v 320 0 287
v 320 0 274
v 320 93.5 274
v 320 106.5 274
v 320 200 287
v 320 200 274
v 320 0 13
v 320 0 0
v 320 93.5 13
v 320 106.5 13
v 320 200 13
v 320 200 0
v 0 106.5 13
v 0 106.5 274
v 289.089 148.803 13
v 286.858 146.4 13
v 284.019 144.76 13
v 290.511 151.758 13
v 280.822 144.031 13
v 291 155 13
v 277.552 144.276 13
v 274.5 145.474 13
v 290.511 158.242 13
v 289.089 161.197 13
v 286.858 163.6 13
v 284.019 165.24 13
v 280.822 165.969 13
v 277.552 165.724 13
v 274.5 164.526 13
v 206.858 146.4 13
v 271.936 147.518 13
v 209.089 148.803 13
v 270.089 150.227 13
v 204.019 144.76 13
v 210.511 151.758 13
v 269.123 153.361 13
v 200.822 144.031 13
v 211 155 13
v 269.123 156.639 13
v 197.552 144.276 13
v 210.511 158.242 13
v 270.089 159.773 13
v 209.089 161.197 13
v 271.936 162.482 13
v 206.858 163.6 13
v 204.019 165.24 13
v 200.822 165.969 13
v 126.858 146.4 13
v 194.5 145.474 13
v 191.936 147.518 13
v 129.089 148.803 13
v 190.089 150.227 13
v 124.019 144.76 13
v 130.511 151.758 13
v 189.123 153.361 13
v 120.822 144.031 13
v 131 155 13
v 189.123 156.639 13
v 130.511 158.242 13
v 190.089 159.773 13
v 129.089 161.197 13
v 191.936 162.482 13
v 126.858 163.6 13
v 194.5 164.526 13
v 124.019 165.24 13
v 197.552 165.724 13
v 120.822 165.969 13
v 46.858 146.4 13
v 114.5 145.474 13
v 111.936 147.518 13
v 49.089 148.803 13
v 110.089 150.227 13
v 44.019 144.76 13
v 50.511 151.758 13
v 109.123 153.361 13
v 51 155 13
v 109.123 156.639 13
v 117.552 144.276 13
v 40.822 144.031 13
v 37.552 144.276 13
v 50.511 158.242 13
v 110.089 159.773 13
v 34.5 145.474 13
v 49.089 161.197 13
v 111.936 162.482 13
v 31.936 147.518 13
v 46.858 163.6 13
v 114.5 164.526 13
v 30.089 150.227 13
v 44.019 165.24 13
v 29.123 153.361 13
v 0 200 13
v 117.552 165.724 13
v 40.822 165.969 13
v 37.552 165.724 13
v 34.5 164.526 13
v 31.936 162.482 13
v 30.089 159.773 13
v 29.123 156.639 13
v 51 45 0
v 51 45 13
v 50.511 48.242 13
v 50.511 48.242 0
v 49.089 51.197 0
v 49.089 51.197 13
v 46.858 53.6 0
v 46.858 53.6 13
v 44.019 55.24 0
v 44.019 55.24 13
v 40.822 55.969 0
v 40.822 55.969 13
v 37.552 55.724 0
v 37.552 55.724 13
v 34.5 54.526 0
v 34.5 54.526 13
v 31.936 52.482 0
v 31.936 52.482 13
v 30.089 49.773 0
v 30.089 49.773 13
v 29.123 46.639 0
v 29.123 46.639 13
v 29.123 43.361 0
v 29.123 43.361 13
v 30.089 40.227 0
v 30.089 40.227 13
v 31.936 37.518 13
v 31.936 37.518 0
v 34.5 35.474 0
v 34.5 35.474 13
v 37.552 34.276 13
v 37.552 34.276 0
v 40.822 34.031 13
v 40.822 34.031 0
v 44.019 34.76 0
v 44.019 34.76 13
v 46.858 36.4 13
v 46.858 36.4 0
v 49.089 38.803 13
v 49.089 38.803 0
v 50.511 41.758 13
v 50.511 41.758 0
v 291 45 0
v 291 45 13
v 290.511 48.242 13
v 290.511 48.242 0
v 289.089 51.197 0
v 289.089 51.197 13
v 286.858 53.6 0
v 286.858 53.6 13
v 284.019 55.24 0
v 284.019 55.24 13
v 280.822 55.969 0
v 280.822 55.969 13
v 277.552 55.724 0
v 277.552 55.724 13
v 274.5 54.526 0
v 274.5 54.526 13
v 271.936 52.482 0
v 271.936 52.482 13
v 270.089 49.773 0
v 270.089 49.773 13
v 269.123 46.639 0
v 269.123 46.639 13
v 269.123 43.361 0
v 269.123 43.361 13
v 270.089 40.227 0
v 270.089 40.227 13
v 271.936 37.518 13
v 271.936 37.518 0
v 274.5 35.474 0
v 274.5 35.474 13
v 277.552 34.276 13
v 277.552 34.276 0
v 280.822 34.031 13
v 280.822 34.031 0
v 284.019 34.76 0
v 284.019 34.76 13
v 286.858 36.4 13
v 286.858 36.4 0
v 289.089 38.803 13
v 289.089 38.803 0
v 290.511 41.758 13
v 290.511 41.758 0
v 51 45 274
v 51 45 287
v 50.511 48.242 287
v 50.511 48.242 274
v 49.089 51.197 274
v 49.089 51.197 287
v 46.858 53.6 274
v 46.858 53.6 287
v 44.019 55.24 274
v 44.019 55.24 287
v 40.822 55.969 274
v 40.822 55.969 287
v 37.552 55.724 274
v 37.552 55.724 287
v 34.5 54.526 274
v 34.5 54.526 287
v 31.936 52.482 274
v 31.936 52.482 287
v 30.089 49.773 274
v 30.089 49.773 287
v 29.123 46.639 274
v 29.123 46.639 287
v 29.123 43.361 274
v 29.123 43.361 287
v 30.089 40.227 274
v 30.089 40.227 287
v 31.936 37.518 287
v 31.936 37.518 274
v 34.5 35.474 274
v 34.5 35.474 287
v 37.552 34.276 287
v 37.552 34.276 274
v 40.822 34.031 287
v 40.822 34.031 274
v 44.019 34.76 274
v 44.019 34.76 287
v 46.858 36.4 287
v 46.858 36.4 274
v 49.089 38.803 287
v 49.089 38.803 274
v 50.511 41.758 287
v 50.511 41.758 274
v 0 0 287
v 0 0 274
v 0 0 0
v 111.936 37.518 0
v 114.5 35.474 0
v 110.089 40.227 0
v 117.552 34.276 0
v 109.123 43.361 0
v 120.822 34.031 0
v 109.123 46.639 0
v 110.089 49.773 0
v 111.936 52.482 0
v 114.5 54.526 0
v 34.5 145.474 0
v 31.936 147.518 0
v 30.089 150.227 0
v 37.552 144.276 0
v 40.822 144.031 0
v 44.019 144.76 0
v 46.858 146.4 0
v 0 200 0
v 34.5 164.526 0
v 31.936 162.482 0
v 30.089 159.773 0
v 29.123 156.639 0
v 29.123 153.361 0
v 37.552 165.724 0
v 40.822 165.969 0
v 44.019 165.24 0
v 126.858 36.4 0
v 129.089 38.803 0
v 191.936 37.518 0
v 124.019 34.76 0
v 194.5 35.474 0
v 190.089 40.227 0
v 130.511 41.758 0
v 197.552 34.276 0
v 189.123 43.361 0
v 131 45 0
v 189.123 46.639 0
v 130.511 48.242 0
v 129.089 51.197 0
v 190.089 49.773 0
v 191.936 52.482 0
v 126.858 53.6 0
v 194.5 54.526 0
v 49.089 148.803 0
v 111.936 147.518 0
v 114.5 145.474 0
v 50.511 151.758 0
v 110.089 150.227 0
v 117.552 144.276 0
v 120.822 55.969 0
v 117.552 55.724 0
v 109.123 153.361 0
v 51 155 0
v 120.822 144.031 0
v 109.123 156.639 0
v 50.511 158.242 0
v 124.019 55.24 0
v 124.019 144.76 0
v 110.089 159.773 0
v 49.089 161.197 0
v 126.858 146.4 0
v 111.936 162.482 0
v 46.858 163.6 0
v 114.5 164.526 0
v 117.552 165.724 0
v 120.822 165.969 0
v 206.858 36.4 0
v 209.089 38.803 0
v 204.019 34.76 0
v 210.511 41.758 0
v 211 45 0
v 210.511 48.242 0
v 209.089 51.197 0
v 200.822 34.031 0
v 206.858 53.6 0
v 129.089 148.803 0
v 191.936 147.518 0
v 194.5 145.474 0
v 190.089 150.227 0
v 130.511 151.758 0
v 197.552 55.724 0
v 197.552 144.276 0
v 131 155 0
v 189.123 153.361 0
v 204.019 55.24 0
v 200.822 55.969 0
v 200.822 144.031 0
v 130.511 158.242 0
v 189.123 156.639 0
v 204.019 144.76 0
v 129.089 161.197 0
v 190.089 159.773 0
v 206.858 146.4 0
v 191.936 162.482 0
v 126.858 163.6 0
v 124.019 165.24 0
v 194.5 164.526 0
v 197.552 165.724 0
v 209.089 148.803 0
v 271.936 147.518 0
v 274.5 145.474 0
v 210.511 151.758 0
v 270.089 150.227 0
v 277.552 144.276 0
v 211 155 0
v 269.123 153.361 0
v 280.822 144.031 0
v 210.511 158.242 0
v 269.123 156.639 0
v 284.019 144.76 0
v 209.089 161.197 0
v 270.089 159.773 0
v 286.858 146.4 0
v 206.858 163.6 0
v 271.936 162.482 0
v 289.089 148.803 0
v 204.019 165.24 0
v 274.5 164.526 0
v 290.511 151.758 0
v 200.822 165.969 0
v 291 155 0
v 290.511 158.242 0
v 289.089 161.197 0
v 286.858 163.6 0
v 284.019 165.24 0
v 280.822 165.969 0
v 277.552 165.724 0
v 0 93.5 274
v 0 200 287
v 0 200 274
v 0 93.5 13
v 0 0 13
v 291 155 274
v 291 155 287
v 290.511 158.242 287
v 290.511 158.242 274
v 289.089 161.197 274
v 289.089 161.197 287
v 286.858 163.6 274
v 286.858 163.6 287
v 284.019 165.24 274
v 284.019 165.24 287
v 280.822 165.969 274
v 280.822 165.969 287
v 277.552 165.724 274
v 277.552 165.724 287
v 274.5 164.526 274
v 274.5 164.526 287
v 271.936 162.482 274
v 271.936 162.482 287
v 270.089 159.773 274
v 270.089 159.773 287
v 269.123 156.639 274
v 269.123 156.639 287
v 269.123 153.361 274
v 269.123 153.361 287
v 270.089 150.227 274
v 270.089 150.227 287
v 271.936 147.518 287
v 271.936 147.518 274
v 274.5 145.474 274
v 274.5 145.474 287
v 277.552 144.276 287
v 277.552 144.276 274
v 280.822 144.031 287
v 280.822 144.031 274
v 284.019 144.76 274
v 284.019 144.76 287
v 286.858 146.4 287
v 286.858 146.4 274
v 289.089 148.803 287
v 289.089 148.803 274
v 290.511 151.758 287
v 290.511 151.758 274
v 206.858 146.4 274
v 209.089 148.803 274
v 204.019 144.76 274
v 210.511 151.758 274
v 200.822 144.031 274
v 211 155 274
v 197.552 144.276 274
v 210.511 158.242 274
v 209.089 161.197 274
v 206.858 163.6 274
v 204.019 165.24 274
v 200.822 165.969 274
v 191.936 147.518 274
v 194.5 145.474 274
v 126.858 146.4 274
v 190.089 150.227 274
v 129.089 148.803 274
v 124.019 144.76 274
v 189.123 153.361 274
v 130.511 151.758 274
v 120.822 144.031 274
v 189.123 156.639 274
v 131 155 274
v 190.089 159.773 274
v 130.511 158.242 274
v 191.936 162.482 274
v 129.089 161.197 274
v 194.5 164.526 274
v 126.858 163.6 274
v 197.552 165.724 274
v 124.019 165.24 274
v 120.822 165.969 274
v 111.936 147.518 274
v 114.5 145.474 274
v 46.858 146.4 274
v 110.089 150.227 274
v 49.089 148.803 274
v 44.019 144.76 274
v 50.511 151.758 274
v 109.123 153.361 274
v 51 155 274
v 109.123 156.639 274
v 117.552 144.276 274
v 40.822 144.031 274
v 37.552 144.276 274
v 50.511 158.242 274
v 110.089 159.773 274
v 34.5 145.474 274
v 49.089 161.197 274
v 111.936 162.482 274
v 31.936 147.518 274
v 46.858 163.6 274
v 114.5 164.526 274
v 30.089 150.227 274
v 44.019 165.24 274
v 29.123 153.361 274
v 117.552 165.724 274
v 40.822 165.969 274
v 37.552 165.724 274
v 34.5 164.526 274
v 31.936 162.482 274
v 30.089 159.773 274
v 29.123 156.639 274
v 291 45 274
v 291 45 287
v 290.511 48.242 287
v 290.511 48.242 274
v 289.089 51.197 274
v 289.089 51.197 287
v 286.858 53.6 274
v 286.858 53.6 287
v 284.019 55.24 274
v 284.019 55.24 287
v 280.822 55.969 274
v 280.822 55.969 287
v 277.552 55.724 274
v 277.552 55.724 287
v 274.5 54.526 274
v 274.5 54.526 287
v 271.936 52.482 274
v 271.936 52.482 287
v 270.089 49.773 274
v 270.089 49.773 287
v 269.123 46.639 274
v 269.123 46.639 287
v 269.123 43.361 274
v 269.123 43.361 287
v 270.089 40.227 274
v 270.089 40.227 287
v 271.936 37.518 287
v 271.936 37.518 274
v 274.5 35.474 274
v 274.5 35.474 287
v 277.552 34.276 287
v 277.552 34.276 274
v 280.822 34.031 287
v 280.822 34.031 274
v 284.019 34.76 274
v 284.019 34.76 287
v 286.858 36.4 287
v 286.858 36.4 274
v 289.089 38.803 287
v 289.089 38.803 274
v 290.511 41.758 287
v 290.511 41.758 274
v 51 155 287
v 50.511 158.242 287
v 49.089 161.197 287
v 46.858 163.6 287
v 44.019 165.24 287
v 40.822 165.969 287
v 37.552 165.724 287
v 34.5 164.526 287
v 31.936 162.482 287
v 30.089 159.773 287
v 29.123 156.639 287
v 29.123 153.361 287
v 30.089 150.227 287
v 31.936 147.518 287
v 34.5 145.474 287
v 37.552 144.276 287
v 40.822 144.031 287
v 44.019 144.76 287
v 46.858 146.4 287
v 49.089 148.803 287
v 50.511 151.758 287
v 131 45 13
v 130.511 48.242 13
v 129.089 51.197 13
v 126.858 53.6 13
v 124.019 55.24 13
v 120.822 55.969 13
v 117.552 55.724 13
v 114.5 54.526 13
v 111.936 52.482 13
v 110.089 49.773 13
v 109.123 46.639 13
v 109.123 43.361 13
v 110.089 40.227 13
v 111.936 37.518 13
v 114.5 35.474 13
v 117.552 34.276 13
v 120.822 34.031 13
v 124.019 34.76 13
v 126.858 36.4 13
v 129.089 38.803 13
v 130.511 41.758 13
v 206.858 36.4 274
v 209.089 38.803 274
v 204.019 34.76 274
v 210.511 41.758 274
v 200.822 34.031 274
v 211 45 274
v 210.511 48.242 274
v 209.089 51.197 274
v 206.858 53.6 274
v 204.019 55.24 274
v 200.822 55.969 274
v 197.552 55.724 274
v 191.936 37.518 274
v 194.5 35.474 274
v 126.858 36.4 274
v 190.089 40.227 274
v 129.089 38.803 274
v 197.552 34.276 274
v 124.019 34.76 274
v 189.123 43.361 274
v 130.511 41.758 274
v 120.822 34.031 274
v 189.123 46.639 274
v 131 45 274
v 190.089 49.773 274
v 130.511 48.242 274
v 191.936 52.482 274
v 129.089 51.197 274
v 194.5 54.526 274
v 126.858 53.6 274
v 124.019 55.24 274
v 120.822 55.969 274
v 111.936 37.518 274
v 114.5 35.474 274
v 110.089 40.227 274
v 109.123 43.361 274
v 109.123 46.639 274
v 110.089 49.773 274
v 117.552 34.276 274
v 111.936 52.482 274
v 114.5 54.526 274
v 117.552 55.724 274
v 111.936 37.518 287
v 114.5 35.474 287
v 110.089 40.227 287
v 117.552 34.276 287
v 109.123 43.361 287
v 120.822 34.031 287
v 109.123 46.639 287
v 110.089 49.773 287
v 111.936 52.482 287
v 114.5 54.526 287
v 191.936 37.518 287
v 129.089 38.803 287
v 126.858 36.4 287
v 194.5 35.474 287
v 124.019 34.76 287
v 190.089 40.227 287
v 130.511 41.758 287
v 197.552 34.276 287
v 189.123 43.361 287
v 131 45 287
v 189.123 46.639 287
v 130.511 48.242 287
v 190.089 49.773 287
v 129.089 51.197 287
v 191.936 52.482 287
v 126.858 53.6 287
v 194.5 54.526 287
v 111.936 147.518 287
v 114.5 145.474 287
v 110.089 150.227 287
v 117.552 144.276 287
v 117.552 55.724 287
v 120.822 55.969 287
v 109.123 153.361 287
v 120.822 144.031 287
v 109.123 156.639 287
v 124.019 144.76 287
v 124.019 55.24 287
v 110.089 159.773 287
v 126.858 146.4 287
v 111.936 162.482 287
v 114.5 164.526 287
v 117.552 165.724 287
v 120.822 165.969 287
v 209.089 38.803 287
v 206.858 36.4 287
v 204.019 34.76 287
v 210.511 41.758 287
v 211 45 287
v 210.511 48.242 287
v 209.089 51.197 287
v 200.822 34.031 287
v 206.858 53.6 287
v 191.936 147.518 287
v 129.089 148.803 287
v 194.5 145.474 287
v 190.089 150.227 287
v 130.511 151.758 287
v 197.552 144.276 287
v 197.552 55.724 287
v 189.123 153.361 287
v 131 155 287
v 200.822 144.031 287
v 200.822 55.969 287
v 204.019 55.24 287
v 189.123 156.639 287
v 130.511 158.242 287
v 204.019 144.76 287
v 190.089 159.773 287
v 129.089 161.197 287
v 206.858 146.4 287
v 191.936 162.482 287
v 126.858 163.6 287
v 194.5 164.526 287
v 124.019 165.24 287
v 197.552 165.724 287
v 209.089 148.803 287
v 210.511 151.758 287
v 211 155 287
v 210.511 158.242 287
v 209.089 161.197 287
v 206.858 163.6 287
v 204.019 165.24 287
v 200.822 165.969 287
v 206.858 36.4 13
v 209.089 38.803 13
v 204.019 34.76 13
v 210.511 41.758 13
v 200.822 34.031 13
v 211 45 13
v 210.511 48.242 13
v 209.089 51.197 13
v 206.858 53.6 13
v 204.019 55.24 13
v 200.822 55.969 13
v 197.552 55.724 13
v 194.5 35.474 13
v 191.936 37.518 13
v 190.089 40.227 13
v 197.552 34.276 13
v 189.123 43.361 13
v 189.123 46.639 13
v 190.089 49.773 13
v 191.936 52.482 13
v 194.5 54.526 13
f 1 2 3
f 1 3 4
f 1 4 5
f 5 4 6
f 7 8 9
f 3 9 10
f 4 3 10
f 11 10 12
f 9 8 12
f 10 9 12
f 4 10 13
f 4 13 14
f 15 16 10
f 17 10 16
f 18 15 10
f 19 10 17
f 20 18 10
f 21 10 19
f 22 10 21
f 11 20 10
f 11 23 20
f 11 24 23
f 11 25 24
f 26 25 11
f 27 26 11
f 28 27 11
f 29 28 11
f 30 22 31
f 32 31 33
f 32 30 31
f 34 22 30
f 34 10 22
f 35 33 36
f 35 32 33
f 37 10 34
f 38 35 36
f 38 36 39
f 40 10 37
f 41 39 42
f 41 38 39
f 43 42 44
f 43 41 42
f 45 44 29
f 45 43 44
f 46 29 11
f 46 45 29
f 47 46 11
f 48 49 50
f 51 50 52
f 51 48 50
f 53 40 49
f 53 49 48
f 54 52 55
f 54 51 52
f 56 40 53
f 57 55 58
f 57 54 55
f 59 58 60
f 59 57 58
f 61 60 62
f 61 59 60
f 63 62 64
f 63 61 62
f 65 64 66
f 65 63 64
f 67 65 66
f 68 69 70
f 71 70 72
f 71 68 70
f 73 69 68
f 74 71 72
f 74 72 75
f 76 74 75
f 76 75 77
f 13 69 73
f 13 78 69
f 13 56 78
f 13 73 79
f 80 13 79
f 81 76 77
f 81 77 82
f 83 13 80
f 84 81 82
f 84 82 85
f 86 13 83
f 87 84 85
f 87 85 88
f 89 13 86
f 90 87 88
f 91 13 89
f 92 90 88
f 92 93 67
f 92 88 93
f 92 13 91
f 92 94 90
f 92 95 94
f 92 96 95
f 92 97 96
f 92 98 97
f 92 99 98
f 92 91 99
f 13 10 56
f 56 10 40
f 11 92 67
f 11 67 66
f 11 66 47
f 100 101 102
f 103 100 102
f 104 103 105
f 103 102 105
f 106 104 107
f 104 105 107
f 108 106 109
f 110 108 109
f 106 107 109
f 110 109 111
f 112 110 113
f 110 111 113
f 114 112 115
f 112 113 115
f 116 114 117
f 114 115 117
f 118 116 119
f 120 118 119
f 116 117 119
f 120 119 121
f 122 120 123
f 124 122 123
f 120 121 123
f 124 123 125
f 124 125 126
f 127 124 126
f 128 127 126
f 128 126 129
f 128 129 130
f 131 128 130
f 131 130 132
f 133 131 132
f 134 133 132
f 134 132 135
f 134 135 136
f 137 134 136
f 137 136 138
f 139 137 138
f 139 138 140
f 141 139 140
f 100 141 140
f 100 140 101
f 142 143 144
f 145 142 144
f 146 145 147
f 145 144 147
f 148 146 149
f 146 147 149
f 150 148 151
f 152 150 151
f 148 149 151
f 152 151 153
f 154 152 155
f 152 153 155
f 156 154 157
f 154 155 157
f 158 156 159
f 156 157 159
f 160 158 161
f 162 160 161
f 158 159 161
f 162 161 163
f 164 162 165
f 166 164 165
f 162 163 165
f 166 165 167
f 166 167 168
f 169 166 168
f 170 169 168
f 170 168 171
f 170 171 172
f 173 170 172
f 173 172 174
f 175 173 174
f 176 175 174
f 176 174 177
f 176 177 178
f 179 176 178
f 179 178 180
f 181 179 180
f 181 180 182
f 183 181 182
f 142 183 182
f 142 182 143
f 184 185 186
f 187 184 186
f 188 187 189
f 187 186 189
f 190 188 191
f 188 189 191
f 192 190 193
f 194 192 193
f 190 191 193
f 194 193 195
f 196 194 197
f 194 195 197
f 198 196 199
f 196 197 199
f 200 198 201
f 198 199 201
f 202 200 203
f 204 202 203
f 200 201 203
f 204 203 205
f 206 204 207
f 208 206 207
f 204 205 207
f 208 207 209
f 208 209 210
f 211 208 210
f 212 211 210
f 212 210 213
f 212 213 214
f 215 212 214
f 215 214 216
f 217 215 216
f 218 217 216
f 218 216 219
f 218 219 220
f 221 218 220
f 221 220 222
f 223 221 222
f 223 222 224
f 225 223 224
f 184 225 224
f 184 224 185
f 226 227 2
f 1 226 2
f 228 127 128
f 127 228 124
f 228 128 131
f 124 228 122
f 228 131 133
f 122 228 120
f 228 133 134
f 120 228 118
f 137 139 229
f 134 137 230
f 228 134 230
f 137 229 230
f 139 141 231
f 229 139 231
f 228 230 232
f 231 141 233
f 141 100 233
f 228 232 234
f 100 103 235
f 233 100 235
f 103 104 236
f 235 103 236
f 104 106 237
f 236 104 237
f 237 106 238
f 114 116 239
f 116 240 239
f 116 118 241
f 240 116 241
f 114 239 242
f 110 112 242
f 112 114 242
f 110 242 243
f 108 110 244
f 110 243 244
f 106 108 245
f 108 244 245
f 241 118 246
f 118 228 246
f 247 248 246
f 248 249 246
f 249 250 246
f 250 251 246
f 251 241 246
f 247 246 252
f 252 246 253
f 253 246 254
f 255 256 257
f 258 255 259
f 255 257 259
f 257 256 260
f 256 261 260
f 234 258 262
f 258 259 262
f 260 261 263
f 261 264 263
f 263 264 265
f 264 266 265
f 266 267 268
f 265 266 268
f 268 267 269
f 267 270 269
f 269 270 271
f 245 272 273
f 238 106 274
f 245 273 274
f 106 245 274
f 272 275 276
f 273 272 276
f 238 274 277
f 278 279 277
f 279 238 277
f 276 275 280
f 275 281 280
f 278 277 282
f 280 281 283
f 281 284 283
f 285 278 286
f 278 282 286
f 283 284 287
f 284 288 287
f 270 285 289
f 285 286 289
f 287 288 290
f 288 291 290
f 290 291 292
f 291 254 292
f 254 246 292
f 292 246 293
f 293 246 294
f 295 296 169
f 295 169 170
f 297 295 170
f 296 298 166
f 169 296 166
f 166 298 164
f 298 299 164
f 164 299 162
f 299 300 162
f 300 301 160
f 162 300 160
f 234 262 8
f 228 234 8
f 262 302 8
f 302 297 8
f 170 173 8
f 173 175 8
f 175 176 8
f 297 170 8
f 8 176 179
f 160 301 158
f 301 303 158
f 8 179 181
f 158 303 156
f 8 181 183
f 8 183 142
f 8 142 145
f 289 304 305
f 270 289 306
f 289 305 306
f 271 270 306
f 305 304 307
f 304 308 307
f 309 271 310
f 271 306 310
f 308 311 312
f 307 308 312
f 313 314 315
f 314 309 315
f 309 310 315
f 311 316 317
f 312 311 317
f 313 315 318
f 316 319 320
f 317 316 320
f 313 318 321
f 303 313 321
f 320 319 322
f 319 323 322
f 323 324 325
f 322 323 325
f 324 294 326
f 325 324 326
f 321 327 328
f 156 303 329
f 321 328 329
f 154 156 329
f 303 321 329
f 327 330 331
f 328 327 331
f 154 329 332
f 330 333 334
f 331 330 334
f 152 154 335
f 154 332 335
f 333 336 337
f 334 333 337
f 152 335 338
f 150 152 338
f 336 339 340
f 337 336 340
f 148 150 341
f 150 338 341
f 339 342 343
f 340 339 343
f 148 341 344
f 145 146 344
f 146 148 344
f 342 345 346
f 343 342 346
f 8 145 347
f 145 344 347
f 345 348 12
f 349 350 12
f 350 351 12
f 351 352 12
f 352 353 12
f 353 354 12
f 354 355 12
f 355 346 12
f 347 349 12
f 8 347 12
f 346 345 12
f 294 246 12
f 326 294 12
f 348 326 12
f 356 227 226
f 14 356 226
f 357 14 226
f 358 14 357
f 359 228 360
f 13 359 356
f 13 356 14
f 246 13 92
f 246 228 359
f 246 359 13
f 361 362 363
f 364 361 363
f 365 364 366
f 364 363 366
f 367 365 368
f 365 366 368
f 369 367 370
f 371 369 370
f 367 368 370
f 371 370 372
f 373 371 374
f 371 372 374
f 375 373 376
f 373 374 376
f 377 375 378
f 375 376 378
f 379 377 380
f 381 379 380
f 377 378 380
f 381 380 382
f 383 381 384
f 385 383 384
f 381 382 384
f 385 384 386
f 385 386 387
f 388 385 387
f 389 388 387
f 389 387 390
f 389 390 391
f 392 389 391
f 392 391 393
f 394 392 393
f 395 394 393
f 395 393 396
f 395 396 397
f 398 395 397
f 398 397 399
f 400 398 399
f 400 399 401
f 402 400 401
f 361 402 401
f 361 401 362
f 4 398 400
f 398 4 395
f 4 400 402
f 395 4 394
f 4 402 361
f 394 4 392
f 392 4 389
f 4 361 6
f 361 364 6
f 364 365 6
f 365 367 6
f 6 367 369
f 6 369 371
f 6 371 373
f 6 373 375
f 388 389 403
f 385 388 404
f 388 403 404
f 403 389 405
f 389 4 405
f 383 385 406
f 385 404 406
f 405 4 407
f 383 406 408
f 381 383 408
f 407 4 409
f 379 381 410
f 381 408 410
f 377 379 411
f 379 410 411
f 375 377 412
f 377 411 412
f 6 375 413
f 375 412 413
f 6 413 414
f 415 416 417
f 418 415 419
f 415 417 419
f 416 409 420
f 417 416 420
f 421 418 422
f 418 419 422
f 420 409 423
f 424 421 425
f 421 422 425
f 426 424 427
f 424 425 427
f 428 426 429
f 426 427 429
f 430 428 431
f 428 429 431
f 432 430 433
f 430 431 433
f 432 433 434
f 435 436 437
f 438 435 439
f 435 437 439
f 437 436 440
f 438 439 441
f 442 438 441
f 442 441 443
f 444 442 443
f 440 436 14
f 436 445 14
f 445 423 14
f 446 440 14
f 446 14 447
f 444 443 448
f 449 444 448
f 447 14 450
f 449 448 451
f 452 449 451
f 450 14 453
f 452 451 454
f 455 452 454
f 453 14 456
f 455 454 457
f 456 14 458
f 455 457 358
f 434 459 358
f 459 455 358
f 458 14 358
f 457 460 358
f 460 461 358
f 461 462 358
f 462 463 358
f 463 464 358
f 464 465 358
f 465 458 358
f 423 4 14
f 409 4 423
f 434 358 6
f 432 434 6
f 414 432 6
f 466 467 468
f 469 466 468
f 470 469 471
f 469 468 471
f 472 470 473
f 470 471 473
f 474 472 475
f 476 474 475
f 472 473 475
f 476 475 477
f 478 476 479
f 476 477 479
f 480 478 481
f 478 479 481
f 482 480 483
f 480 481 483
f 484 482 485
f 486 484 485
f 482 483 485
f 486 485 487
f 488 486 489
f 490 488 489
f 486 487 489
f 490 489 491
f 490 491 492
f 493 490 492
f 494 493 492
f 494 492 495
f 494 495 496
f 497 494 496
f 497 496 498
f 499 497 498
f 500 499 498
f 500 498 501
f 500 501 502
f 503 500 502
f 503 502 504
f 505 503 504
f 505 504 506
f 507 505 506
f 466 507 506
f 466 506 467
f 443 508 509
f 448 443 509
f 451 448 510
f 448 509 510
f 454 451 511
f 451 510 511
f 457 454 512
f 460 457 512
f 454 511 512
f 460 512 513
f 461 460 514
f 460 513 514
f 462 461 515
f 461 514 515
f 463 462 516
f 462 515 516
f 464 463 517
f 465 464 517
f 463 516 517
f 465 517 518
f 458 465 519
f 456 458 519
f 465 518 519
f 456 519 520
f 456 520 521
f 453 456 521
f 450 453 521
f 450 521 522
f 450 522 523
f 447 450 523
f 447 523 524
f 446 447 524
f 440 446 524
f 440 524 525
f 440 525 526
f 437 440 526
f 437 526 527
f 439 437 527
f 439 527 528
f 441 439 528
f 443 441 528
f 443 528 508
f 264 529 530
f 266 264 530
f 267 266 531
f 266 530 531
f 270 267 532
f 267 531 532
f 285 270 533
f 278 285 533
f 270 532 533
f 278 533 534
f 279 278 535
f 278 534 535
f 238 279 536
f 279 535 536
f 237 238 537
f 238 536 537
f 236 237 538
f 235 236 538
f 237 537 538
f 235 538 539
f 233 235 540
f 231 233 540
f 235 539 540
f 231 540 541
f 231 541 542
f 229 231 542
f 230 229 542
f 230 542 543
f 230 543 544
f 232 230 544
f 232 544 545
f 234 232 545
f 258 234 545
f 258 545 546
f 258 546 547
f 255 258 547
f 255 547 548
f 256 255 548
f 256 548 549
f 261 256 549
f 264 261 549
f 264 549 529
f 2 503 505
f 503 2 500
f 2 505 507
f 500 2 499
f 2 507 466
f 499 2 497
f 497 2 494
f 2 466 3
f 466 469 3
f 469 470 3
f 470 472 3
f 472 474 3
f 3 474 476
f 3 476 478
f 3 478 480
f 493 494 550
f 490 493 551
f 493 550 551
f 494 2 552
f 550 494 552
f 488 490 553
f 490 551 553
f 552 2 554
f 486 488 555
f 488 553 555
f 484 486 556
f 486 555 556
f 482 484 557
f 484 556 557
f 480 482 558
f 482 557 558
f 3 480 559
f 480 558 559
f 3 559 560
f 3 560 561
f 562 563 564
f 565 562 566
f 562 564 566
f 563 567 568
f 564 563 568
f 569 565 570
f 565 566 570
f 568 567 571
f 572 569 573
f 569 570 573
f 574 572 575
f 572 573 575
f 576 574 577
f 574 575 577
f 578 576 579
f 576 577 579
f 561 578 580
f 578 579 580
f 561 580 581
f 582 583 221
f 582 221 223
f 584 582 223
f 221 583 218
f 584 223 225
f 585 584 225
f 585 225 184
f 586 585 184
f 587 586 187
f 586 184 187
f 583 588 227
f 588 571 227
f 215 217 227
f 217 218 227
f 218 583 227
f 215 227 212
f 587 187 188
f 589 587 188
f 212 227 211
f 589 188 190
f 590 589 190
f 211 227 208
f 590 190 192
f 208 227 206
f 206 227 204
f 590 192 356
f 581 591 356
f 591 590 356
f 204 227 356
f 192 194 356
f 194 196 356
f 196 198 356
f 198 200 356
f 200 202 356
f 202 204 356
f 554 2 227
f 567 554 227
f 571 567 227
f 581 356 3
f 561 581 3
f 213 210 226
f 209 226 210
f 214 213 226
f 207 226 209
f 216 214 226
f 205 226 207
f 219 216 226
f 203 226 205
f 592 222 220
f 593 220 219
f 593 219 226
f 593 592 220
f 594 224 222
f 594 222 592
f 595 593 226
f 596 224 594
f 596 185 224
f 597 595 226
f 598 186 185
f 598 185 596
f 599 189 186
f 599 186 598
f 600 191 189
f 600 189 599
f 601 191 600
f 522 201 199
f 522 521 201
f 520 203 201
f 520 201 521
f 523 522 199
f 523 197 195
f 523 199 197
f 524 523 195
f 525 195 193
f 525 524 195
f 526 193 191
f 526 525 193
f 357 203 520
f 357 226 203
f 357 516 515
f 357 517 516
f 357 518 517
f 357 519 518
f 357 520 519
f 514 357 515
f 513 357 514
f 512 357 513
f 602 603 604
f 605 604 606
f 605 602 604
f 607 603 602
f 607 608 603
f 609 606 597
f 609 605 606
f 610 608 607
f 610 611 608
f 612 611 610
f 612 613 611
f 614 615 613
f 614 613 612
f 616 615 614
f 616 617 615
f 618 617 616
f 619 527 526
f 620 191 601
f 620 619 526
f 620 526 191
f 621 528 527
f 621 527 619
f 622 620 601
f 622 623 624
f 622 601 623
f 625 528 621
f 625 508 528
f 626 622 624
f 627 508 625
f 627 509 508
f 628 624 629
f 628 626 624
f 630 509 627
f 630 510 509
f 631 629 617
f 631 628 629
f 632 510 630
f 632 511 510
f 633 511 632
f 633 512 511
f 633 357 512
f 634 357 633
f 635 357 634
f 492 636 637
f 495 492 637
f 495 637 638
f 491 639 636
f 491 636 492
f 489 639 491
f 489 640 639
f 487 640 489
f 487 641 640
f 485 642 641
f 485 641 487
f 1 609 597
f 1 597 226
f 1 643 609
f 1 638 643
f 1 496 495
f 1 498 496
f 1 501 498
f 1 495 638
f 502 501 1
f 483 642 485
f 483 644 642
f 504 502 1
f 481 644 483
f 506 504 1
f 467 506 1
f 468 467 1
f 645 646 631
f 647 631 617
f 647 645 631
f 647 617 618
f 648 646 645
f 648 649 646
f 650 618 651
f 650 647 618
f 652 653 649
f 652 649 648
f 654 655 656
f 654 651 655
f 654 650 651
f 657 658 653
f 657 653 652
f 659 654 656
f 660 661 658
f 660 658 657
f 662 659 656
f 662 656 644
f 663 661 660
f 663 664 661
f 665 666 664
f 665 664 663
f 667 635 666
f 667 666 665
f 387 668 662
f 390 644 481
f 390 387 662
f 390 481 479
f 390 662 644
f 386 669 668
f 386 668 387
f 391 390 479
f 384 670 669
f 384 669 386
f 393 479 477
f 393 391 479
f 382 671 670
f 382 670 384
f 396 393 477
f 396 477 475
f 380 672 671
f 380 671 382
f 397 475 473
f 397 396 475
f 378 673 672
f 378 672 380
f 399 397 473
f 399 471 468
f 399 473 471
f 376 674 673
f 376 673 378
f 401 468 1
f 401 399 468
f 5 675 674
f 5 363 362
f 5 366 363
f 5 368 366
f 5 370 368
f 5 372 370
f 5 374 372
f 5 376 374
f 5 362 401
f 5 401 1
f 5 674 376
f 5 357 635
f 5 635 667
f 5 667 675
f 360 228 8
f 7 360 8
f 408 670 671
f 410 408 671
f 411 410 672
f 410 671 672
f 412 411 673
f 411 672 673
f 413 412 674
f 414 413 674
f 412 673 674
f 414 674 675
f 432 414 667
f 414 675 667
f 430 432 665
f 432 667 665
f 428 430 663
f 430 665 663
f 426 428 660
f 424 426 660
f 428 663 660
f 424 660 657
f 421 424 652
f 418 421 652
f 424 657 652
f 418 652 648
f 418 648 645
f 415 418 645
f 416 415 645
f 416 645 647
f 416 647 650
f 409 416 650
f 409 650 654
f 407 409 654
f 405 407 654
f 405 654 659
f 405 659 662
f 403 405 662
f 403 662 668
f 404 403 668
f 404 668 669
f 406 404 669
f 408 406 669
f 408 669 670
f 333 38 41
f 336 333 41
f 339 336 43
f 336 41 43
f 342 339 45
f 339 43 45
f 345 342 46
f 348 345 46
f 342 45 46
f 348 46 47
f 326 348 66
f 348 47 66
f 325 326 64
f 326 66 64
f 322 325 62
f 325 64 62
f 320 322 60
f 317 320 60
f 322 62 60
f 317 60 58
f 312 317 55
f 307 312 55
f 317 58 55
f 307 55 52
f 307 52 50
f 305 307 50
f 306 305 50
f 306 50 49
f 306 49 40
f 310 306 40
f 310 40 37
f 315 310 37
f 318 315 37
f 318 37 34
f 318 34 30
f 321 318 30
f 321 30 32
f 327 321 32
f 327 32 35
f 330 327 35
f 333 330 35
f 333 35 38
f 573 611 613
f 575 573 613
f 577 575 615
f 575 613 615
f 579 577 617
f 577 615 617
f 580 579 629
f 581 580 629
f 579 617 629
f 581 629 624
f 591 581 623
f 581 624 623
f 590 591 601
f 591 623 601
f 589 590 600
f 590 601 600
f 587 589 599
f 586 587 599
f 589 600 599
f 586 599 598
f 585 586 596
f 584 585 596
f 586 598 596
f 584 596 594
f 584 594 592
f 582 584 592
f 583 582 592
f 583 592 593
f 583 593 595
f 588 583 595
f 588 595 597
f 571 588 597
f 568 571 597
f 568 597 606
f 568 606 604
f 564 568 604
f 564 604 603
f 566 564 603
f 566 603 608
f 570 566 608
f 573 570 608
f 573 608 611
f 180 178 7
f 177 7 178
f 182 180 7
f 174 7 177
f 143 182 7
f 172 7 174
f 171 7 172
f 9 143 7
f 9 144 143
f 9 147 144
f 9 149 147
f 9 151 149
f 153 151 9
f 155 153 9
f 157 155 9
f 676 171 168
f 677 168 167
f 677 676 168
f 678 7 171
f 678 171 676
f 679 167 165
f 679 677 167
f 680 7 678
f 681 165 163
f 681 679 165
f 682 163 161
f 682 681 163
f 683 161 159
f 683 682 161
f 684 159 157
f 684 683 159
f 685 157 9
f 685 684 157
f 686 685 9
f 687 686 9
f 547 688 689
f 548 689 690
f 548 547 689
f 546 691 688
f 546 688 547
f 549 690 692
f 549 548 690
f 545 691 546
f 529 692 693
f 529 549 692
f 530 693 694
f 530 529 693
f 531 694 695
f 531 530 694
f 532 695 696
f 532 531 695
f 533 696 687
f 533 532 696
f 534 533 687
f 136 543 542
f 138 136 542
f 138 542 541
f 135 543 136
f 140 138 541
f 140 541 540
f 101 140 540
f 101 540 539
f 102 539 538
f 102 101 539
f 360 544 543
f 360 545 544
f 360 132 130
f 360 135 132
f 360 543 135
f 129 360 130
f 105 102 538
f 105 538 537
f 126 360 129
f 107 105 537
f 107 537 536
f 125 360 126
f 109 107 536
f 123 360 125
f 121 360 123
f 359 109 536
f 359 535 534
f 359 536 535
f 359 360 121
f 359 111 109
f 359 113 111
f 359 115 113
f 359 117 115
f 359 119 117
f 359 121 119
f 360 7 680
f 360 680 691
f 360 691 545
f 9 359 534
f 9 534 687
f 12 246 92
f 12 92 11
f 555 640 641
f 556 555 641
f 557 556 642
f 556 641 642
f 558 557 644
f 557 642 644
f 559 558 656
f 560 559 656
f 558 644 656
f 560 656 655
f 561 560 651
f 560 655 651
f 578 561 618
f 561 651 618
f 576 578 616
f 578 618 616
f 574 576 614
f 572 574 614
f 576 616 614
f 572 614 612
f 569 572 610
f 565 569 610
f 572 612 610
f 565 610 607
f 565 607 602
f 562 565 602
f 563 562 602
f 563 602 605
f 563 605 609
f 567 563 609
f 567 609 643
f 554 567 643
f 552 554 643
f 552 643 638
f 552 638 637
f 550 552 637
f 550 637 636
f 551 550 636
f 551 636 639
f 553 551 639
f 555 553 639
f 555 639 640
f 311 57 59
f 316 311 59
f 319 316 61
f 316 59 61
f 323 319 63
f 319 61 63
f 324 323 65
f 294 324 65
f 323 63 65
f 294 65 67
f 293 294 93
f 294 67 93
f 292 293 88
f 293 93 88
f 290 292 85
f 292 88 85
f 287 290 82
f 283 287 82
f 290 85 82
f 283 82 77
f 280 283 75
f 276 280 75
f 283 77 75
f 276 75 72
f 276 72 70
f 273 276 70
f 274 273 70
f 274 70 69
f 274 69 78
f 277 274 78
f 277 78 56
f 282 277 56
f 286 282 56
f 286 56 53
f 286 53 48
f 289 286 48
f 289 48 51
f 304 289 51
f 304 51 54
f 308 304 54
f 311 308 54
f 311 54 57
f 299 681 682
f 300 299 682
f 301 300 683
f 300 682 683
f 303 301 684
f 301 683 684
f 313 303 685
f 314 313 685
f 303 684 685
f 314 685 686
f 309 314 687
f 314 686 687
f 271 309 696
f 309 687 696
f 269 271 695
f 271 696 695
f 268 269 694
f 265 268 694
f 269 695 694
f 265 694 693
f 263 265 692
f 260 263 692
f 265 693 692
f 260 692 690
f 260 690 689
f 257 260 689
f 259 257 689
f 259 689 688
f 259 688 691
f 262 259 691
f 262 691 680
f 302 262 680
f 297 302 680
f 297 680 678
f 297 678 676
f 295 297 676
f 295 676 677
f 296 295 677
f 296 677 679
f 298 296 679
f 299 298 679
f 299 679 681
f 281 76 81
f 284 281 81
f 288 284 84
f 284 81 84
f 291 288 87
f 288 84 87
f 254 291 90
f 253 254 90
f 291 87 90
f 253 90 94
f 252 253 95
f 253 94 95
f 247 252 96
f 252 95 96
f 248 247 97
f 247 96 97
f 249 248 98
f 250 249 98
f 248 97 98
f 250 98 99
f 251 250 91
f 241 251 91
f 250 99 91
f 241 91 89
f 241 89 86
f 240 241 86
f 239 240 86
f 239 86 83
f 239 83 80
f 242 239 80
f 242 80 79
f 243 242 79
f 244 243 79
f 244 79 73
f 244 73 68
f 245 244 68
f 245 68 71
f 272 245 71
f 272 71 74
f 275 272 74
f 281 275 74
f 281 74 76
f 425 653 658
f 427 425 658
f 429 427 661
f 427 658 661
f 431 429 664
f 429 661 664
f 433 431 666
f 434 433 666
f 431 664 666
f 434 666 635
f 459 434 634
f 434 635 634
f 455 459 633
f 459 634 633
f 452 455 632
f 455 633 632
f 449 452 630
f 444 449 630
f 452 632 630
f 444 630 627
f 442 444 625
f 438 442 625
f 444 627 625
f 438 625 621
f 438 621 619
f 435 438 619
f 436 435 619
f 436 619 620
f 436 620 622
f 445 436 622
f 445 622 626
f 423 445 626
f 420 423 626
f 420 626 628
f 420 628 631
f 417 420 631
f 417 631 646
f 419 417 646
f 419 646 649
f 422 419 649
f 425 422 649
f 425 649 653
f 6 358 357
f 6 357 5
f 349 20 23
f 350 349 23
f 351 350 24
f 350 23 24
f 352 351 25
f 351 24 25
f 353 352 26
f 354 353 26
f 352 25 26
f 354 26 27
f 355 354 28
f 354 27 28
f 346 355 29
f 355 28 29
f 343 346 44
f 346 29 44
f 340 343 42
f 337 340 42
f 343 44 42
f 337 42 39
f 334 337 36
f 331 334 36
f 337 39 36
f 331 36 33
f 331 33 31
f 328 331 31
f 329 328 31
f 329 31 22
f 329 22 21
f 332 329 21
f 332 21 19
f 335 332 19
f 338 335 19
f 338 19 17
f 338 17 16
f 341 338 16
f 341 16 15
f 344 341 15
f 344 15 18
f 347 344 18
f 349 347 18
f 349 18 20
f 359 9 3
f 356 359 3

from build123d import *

# Parameters (mm, degrees)
SKETCH_1_W                  = 320
SKETCH_1_H                  = 200
EXTRUDE_1_DEPTH             = 287
SKETCH_2_R                  = 11
CUT_EXTRUDE_1_DEPTH         = 475.098091116
PATTERN_LINEAR_1_COUNT      = 4
PATTERN_LINEAR_1_PITCH      = 80
PATTERN_LINEAR_1_COUNT_DIR2 = 2
PATTERN_LINEAR_1_PITCH_DIR2 = 110
SKETCH_6_W                  = 261
SKETCH_6_H                  = 93.5
CUT_EXTRUDE_3_DEPTH         = 475.098091116


with BuildPart() as part:
    # 草图1 → 拉伸1 (new body)
    with BuildSketch(Plane.XY):
        with Locations((160, 100)):
            Rectangle(SKETCH_1_W, SKETCH_1_H)
    extrude(amount=EXTRUDE_1_DEPTH)

    # 草图2 → 切除-拉伸1 (cut, through all)
    with BuildSketch(Plane.XY.offset(287)):
        with Locations((40, 45)):
            Circle(SKETCH_2_R)
    cut_extrude_1 = extrude(amount=-CUT_EXTRUDE_1_DEPTH, mode=Mode.SUBTRACT)

    # 阵列(线性)1: Cut-Extrude 1 4 × 2
    with Locations(*[(i * PATTERN_LINEAR_1_PITCH, j * PATTERN_LINEAR_1_PITCH_DIR2, 0) for i in range(PATTERN_LINEAR_1_COUNT) for j in range(PATTERN_LINEAR_1_COUNT_DIR2) if (i, j) != (0, 0)]):
        add(cut_extrude_1, mode=Mode.SUBTRACT)

    # 草图6 → 切除-拉伸3 (cut, through all)
    with BuildSketch(Plane.ZY):
        with Locations((143.5, 153.25)):
            Rectangle(SKETCH_6_W, SKETCH_6_H)
        with Locations((143.5, 46.75)):
            Rectangle(SKETCH_6_W, SKETCH_6_H)
    extrude(amount=-CUT_EXTRUDE_3_DEPTH, mode=Mode.SUBTRACT)


solid = part.part
